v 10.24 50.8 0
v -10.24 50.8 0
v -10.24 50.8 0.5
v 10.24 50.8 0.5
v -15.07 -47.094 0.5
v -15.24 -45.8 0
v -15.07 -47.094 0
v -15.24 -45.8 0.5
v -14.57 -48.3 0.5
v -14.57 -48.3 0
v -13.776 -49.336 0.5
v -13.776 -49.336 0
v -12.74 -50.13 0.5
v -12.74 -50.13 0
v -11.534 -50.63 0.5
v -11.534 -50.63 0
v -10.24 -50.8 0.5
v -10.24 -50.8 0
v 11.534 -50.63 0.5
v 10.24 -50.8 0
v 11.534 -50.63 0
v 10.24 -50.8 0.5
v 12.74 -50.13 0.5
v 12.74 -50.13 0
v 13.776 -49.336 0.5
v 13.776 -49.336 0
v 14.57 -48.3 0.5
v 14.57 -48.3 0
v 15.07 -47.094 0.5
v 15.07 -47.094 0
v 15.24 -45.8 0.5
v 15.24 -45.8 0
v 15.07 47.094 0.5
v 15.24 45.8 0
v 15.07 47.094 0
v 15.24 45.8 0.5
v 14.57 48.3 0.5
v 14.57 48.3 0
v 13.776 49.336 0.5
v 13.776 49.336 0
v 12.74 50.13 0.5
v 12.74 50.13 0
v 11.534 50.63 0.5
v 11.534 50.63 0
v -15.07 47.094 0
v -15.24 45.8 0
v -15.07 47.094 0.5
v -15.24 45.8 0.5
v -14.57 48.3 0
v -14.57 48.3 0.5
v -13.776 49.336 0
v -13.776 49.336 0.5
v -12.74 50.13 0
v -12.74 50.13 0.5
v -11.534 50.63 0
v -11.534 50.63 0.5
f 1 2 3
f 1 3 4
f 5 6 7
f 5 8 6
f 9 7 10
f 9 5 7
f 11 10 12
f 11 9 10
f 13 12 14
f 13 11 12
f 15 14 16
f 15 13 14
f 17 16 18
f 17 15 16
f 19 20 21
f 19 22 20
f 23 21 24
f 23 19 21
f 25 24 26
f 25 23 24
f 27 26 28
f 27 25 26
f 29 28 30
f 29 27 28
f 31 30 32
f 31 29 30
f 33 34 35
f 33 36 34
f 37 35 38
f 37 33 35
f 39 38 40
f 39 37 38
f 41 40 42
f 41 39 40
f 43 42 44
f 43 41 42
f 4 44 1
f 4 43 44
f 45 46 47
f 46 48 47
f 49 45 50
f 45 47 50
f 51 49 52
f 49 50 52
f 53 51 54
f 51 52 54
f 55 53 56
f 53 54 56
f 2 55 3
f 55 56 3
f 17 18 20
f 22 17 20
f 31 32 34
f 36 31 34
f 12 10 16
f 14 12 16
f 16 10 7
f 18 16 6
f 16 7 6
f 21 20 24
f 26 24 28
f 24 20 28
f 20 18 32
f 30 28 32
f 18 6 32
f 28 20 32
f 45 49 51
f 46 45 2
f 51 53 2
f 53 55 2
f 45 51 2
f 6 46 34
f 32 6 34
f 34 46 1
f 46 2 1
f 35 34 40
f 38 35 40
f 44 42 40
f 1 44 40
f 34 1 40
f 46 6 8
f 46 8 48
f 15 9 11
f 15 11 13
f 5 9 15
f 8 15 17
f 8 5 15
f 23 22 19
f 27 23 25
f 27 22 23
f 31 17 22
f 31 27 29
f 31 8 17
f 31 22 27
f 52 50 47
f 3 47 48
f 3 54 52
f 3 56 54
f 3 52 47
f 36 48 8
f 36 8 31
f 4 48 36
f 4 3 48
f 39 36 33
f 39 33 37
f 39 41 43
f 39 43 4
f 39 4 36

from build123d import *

# Parameters (mm, degrees)
F0_W     = 30.48
F0_H     = 101.6
F1_DEPTH = 0.5
F2_R     = 5
F4_R     = 12.6
F5_DEPTH = 0.5


with BuildPart() as f1:
    # F0 (on Top) → F1 (new body)
    with BuildSketch(Plane.XY):
        Rectangle(F0_W, F0_H)
    extrude(amount=F1_DEPTH)

    # F2
    f2_edges = [f1.edges().sort_by_distance(p)[0] for p in [
        (15.24, -50.8, 0.25),
        (-15.24, -50.8, 0.25),
        (-15.24, 50.8, 0.25),
        (15.24, 50.8, 0.25),
    ]]
    fillet(f2_edges, radius=F2_R)


with BuildPart() as f5:
    # F4 (on offset) → F5 (new body)
    with BuildSketch(Plane.XY.offset(25.5)):
        Circle(F4_R)
    extrude(amount=F5_DEPTH)


solid = f1.part
